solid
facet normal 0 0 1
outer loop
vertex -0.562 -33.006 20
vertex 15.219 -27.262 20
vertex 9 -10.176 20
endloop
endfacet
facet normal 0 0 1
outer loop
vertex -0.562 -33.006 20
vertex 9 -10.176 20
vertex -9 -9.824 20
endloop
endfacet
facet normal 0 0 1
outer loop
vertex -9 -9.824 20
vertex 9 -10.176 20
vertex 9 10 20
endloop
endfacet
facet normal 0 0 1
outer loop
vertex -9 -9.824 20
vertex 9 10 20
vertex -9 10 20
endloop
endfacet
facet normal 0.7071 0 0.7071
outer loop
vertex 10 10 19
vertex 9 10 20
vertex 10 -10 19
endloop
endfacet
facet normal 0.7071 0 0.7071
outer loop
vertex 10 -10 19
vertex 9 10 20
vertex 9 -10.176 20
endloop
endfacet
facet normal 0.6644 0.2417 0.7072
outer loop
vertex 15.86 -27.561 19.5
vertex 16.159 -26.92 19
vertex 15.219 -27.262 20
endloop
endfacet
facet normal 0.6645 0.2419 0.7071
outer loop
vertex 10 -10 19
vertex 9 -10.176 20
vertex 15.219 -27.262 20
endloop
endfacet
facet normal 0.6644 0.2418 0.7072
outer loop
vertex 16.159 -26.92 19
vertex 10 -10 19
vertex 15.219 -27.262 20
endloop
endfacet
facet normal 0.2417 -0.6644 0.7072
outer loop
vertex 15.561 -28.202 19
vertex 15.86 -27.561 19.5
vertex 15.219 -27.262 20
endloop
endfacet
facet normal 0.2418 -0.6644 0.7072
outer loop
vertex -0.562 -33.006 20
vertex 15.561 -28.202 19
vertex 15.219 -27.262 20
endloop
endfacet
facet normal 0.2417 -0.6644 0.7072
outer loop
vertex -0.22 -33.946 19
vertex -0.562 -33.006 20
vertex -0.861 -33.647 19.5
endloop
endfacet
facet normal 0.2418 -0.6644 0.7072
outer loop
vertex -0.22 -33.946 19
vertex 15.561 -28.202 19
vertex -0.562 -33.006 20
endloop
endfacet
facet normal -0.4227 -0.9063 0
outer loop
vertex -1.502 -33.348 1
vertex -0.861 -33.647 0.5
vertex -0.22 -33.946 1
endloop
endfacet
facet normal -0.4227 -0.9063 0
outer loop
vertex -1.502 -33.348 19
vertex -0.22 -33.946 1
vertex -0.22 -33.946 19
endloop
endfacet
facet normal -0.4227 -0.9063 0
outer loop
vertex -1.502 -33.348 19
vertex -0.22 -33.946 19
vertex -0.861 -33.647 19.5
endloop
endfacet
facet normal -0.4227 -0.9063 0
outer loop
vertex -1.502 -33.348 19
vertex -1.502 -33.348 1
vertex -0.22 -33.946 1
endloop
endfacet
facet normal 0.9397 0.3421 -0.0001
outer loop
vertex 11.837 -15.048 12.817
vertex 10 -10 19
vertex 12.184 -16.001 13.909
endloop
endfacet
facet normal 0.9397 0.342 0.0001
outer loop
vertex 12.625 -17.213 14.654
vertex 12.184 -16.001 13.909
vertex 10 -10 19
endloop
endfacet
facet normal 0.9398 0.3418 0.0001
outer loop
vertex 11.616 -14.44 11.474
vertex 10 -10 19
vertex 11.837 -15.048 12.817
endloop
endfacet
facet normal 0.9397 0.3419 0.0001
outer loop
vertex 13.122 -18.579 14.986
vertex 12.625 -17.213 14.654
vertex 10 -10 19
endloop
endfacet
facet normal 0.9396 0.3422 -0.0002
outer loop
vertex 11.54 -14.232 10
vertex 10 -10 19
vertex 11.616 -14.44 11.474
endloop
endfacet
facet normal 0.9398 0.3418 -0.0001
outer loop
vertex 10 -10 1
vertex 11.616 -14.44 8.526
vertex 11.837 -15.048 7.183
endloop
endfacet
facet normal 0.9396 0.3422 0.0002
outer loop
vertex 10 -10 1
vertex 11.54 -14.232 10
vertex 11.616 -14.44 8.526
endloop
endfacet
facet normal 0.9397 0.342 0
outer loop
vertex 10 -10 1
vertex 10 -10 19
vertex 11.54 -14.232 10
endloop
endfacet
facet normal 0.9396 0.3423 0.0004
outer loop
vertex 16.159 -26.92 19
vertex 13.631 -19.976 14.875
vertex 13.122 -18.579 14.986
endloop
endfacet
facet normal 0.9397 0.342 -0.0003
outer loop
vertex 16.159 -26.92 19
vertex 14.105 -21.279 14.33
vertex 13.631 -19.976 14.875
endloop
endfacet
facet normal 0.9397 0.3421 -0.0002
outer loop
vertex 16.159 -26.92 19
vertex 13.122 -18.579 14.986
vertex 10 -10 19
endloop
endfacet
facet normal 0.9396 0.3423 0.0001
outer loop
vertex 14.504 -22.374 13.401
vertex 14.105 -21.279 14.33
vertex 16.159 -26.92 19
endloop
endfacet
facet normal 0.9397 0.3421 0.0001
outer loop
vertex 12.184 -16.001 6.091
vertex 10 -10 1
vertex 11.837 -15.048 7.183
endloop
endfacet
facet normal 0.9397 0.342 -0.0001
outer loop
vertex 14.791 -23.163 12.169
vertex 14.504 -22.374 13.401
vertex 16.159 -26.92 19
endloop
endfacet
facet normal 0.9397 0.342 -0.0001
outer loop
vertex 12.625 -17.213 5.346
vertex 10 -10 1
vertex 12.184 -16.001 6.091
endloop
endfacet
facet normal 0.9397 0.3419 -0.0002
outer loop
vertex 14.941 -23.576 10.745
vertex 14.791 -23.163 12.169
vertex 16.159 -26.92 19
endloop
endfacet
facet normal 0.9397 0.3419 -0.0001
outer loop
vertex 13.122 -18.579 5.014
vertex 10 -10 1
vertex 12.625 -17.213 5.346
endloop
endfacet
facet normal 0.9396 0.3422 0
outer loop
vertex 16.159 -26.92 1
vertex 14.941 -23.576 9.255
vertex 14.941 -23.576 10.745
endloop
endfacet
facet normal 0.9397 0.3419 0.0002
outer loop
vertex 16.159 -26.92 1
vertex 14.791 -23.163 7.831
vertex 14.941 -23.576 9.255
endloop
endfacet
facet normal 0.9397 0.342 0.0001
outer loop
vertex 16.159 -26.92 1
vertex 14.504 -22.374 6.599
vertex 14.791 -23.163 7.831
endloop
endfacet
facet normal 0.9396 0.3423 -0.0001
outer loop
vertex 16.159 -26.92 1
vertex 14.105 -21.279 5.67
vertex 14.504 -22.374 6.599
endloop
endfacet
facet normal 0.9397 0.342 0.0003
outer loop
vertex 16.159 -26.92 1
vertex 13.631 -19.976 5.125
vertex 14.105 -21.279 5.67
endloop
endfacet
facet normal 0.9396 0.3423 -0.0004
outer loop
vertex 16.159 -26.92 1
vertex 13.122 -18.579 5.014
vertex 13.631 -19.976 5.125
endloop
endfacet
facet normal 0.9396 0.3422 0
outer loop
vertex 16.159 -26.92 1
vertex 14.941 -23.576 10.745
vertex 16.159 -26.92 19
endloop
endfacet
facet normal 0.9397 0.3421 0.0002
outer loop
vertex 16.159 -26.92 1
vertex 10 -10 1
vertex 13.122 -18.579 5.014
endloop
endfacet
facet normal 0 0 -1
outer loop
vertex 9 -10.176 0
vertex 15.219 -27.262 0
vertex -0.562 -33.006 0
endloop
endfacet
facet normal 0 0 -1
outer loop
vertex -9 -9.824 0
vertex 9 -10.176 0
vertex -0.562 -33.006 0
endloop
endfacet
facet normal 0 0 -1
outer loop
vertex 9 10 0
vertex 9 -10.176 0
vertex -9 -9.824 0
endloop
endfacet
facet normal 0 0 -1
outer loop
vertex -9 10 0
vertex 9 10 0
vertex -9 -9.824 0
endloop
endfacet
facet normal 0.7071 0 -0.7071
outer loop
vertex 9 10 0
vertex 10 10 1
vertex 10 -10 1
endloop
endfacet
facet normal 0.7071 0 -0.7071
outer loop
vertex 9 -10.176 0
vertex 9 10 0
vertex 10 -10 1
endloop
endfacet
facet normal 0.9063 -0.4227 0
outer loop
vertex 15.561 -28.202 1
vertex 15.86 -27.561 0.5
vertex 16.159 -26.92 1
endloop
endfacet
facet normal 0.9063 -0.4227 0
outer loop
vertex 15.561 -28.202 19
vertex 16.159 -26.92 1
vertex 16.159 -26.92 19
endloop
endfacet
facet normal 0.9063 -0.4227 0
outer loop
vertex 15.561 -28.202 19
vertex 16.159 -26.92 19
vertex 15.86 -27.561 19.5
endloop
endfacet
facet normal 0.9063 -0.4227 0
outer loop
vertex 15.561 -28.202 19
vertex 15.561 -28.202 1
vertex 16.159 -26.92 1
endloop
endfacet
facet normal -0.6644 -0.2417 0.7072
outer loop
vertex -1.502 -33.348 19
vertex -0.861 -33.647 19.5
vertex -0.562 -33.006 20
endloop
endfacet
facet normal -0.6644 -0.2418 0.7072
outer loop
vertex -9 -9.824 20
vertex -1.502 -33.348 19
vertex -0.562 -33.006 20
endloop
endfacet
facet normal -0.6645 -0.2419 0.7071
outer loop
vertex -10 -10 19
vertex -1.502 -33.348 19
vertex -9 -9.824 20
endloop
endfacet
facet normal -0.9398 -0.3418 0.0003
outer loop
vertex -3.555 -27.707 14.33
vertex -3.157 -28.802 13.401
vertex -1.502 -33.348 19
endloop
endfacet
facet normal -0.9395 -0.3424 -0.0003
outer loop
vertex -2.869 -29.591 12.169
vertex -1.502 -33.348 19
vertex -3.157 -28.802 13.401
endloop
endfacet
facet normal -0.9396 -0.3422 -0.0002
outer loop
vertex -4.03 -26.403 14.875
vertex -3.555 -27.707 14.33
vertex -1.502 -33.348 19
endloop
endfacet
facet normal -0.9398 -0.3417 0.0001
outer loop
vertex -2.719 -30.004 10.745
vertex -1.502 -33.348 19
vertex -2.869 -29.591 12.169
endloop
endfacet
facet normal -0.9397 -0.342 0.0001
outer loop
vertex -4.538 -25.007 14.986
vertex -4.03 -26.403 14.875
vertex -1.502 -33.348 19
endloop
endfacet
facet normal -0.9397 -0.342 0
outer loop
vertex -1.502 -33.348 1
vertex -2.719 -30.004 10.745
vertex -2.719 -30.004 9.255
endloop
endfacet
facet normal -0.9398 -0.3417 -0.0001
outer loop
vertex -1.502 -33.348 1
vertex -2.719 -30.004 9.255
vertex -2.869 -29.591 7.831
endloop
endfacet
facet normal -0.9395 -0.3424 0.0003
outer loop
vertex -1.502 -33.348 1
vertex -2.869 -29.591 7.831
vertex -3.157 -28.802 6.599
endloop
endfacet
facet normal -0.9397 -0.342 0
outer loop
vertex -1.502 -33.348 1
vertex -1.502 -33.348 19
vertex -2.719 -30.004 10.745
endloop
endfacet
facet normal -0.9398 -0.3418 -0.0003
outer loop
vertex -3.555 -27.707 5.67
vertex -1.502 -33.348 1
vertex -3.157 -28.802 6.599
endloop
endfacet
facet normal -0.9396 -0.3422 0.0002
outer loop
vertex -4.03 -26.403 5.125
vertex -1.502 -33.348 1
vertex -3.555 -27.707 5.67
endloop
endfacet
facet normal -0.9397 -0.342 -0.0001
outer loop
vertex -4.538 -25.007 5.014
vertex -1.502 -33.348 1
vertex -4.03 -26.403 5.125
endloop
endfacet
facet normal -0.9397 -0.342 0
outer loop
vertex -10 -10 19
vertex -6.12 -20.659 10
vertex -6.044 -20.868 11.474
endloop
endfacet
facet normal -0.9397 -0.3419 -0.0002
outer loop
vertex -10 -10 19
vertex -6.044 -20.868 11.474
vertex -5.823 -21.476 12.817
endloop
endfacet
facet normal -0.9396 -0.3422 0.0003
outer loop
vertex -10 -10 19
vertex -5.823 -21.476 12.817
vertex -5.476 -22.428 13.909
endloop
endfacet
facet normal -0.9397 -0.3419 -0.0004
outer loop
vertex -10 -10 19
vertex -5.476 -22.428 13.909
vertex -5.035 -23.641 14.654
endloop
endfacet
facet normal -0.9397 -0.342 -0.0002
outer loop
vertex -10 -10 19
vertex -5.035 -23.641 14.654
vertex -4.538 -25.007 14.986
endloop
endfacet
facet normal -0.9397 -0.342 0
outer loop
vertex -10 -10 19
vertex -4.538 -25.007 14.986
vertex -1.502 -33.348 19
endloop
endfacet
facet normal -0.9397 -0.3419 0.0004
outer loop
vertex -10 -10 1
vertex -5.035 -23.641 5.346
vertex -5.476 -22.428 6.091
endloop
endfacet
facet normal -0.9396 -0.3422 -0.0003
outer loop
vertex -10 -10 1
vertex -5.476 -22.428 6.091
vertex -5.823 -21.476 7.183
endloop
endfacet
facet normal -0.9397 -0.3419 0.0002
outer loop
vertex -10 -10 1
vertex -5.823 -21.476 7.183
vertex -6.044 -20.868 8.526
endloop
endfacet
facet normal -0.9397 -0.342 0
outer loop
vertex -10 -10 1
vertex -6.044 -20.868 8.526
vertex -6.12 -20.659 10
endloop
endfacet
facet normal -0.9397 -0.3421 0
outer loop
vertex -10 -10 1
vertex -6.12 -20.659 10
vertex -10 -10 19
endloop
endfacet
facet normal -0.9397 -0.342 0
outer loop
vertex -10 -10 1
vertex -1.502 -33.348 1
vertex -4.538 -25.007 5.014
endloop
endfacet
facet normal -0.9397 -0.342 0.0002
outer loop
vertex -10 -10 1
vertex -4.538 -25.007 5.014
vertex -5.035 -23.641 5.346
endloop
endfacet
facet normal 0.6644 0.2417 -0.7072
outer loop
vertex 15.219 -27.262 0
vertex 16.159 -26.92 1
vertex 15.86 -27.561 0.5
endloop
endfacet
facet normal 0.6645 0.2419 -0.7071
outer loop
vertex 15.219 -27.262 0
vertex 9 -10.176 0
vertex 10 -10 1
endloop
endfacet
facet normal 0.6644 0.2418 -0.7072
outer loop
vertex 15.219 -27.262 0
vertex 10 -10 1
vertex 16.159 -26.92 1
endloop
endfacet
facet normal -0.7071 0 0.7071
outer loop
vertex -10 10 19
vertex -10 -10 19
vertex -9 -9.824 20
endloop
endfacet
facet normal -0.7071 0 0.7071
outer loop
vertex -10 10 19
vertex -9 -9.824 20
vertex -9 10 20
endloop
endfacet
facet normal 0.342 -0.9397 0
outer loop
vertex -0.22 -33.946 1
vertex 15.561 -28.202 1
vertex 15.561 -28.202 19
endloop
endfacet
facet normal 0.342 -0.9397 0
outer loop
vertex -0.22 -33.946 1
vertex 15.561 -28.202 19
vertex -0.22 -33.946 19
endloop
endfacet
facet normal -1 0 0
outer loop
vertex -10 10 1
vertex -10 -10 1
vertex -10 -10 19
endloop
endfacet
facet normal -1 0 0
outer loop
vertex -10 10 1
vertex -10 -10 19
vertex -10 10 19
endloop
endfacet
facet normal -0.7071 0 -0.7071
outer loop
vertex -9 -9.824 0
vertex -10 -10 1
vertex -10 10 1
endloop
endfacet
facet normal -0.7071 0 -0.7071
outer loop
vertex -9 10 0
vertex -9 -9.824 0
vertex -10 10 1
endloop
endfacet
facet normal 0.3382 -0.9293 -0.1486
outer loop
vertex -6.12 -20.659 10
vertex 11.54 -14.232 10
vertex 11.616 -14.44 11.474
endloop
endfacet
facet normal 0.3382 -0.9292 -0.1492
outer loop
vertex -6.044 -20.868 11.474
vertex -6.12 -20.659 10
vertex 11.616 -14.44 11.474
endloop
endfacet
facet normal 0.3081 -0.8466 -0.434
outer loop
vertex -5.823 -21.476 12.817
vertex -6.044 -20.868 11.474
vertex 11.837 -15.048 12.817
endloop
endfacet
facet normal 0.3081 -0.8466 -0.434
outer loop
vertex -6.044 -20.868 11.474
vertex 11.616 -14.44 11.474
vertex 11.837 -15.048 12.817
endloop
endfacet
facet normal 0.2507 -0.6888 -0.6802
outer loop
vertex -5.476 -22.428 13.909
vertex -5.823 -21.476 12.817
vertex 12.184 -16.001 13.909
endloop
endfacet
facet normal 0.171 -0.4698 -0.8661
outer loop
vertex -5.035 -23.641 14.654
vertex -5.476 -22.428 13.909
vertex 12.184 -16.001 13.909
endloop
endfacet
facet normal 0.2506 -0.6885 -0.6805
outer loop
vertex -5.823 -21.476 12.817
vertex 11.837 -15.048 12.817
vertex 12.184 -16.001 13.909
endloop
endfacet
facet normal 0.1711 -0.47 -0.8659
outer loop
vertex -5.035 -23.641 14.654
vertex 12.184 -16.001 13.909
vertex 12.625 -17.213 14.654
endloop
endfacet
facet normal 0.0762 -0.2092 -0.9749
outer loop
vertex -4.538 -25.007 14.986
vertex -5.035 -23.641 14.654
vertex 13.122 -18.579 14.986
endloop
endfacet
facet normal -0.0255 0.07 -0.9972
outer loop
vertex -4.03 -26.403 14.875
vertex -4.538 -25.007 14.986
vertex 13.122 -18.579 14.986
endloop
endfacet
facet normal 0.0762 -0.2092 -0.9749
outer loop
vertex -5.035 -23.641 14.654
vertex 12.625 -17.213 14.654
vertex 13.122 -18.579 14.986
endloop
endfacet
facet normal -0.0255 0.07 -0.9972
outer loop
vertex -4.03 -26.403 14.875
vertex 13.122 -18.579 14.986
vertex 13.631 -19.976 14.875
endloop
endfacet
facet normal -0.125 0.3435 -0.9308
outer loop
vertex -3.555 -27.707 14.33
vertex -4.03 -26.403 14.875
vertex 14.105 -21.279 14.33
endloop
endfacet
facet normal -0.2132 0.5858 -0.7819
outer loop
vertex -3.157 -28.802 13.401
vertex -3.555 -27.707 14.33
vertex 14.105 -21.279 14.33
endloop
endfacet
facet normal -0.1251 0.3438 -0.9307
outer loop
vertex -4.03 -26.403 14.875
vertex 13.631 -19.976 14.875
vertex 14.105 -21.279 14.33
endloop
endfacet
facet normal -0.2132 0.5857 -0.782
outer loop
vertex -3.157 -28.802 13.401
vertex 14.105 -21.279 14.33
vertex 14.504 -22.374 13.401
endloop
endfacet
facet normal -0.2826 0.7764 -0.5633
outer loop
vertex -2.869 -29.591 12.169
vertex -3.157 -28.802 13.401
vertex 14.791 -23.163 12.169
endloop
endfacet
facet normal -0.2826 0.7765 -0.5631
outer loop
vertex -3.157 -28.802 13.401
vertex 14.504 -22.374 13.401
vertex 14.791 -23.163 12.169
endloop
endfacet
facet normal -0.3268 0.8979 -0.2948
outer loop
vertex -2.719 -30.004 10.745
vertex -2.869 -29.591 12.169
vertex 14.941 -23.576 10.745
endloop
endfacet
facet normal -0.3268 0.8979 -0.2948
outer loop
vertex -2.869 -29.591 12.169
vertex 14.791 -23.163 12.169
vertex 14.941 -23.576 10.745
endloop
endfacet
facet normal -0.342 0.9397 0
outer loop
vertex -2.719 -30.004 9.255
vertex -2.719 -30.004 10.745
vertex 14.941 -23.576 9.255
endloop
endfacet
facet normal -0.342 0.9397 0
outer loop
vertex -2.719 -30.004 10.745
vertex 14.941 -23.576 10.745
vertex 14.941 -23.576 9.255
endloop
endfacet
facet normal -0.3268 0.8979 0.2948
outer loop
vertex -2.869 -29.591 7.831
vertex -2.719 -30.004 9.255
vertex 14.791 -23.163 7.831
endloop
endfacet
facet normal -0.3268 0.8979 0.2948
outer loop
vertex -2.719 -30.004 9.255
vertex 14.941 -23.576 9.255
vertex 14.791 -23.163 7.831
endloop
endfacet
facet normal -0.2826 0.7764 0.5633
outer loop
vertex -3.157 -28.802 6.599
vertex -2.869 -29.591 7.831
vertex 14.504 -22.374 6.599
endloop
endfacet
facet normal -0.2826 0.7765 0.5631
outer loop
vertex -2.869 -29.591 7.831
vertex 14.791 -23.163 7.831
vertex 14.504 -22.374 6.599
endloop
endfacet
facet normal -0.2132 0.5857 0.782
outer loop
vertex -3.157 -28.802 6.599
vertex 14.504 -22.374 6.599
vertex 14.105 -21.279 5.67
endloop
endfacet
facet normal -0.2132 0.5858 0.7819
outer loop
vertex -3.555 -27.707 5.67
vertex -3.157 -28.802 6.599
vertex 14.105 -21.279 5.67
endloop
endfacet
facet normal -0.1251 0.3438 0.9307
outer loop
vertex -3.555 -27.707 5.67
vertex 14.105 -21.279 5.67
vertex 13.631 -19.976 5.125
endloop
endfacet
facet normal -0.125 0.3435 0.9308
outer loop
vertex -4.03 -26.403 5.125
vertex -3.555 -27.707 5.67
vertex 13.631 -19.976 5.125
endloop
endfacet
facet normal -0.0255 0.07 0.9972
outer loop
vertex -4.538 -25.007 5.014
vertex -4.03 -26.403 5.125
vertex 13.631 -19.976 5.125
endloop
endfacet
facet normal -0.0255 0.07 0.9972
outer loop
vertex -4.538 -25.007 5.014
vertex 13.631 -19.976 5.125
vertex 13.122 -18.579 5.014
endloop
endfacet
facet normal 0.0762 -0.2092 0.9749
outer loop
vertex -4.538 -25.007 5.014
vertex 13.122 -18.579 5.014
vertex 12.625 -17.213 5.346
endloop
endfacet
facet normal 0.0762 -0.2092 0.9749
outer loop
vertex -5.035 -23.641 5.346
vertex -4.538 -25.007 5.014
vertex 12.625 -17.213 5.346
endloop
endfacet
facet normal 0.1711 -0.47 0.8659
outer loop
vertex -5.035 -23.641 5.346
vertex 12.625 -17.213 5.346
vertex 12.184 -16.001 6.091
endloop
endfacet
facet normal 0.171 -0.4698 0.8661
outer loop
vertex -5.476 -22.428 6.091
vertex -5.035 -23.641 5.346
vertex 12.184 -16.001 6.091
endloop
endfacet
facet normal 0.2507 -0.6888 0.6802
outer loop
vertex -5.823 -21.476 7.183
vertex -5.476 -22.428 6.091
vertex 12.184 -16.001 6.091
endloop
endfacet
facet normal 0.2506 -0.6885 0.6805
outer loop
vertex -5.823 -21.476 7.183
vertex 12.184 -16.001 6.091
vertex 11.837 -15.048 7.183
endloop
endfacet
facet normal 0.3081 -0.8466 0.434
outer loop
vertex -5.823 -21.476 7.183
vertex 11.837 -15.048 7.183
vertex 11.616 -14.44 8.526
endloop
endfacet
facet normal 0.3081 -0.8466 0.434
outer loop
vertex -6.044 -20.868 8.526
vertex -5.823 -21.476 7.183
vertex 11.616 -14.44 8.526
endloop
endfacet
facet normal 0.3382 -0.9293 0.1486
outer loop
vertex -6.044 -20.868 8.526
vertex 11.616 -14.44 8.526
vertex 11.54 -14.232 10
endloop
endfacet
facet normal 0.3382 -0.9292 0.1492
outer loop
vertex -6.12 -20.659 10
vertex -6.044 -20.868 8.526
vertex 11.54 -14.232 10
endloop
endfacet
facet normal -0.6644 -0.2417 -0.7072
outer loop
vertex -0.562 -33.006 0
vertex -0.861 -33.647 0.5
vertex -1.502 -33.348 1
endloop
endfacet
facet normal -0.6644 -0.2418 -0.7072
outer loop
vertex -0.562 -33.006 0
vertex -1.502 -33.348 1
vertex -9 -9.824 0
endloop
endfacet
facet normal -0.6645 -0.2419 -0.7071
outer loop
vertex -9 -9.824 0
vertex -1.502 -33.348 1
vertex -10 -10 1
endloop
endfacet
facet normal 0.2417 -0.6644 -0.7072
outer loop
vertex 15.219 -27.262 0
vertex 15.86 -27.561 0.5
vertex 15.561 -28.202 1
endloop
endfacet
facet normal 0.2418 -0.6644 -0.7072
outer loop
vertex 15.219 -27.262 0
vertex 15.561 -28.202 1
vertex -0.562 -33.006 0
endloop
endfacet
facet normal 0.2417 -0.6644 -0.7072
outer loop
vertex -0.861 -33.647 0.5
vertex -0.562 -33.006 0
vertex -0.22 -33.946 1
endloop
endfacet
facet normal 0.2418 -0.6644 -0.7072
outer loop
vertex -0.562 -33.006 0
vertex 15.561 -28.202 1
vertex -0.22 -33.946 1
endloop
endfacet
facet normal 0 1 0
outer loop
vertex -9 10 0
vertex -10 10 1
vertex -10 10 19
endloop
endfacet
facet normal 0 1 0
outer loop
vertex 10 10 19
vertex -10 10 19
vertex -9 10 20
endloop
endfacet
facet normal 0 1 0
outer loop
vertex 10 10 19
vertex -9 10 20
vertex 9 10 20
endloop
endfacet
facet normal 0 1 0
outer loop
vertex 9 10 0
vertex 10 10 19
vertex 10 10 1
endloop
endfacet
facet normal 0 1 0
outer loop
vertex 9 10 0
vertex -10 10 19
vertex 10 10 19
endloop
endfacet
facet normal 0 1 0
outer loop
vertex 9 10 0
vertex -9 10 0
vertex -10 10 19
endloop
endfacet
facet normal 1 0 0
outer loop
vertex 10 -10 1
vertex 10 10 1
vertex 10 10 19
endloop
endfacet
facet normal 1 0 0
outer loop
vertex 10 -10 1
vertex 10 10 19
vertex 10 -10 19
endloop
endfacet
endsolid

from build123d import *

# Parameters (mm, degrees)
EXTRUDE_1_DEPTH     = 20
SKETCH_2_R          = 5
CUT_EXTRUDE_1_DEPTH = 20
CHAMFER_1_SIZE      = 1
CHAMFER_2_SIZE      = 1


with BuildPart() as part:
    # 草图1 → 凸台-拉伸1 (new body)
    with BuildSketch(Plane.XY):
        Polygon((10, -10), (16.500534984, -27.860073083), (-1.159909447, -34.28794918), (-10, -10), (-10, 10), (10, 10), align=None)
    extrude(amount=EXTRUDE_1_DEPTH)

    # 草图2 → 切除-拉伸1 (cut)
    with BuildSketch(Plane(origin=(5.616284167, 2.044160264, 0), x_dir=(0, 0, -1), z_dir=(0.9396926207859104, 0.34202014332566316, 0))):
        with Locations(Location((-10, -22.320274036, 0), (0, 0, 90))):
            Circle(SKETCH_2_R)
    extrude(amount=-CUT_EXTRUDE_1_DEPTH, mode=Mode.SUBTRACT)

    # 倒角1
    chamfer_1_edges = [part.edges().sort_by_distance(p)[0] for p in [
        (16.500534984, -27.860073083, 10),
        (-1.159909447, -34.28794918, 10),
        (7.670312768, -31.074011132, 20),
        (7.670312768, -31.074011132, 0),
    ]]
    chamfer(chamfer_1_edges, length=CHAMFER_1_SIZE)

    # 倒角2
    chamfer_2_edges = [part.edges().sort_by_distance(p)[0] for p in [
        (-10, 0, 20),
        (-5.750964795, -21.67412828, 20),
        (13.07925742, -18.460190231, 20),
        (13.07925742, -18.460190231, 0),
        (10, 0, 20),
        (-5.750964795, -21.67412828, 0),
        (-10, 0, 0),
        (10, 0, 0),
    ]]
    chamfer(chamfer_2_edges, length=CHAMFER_2_SIZE)


solid = part.part
